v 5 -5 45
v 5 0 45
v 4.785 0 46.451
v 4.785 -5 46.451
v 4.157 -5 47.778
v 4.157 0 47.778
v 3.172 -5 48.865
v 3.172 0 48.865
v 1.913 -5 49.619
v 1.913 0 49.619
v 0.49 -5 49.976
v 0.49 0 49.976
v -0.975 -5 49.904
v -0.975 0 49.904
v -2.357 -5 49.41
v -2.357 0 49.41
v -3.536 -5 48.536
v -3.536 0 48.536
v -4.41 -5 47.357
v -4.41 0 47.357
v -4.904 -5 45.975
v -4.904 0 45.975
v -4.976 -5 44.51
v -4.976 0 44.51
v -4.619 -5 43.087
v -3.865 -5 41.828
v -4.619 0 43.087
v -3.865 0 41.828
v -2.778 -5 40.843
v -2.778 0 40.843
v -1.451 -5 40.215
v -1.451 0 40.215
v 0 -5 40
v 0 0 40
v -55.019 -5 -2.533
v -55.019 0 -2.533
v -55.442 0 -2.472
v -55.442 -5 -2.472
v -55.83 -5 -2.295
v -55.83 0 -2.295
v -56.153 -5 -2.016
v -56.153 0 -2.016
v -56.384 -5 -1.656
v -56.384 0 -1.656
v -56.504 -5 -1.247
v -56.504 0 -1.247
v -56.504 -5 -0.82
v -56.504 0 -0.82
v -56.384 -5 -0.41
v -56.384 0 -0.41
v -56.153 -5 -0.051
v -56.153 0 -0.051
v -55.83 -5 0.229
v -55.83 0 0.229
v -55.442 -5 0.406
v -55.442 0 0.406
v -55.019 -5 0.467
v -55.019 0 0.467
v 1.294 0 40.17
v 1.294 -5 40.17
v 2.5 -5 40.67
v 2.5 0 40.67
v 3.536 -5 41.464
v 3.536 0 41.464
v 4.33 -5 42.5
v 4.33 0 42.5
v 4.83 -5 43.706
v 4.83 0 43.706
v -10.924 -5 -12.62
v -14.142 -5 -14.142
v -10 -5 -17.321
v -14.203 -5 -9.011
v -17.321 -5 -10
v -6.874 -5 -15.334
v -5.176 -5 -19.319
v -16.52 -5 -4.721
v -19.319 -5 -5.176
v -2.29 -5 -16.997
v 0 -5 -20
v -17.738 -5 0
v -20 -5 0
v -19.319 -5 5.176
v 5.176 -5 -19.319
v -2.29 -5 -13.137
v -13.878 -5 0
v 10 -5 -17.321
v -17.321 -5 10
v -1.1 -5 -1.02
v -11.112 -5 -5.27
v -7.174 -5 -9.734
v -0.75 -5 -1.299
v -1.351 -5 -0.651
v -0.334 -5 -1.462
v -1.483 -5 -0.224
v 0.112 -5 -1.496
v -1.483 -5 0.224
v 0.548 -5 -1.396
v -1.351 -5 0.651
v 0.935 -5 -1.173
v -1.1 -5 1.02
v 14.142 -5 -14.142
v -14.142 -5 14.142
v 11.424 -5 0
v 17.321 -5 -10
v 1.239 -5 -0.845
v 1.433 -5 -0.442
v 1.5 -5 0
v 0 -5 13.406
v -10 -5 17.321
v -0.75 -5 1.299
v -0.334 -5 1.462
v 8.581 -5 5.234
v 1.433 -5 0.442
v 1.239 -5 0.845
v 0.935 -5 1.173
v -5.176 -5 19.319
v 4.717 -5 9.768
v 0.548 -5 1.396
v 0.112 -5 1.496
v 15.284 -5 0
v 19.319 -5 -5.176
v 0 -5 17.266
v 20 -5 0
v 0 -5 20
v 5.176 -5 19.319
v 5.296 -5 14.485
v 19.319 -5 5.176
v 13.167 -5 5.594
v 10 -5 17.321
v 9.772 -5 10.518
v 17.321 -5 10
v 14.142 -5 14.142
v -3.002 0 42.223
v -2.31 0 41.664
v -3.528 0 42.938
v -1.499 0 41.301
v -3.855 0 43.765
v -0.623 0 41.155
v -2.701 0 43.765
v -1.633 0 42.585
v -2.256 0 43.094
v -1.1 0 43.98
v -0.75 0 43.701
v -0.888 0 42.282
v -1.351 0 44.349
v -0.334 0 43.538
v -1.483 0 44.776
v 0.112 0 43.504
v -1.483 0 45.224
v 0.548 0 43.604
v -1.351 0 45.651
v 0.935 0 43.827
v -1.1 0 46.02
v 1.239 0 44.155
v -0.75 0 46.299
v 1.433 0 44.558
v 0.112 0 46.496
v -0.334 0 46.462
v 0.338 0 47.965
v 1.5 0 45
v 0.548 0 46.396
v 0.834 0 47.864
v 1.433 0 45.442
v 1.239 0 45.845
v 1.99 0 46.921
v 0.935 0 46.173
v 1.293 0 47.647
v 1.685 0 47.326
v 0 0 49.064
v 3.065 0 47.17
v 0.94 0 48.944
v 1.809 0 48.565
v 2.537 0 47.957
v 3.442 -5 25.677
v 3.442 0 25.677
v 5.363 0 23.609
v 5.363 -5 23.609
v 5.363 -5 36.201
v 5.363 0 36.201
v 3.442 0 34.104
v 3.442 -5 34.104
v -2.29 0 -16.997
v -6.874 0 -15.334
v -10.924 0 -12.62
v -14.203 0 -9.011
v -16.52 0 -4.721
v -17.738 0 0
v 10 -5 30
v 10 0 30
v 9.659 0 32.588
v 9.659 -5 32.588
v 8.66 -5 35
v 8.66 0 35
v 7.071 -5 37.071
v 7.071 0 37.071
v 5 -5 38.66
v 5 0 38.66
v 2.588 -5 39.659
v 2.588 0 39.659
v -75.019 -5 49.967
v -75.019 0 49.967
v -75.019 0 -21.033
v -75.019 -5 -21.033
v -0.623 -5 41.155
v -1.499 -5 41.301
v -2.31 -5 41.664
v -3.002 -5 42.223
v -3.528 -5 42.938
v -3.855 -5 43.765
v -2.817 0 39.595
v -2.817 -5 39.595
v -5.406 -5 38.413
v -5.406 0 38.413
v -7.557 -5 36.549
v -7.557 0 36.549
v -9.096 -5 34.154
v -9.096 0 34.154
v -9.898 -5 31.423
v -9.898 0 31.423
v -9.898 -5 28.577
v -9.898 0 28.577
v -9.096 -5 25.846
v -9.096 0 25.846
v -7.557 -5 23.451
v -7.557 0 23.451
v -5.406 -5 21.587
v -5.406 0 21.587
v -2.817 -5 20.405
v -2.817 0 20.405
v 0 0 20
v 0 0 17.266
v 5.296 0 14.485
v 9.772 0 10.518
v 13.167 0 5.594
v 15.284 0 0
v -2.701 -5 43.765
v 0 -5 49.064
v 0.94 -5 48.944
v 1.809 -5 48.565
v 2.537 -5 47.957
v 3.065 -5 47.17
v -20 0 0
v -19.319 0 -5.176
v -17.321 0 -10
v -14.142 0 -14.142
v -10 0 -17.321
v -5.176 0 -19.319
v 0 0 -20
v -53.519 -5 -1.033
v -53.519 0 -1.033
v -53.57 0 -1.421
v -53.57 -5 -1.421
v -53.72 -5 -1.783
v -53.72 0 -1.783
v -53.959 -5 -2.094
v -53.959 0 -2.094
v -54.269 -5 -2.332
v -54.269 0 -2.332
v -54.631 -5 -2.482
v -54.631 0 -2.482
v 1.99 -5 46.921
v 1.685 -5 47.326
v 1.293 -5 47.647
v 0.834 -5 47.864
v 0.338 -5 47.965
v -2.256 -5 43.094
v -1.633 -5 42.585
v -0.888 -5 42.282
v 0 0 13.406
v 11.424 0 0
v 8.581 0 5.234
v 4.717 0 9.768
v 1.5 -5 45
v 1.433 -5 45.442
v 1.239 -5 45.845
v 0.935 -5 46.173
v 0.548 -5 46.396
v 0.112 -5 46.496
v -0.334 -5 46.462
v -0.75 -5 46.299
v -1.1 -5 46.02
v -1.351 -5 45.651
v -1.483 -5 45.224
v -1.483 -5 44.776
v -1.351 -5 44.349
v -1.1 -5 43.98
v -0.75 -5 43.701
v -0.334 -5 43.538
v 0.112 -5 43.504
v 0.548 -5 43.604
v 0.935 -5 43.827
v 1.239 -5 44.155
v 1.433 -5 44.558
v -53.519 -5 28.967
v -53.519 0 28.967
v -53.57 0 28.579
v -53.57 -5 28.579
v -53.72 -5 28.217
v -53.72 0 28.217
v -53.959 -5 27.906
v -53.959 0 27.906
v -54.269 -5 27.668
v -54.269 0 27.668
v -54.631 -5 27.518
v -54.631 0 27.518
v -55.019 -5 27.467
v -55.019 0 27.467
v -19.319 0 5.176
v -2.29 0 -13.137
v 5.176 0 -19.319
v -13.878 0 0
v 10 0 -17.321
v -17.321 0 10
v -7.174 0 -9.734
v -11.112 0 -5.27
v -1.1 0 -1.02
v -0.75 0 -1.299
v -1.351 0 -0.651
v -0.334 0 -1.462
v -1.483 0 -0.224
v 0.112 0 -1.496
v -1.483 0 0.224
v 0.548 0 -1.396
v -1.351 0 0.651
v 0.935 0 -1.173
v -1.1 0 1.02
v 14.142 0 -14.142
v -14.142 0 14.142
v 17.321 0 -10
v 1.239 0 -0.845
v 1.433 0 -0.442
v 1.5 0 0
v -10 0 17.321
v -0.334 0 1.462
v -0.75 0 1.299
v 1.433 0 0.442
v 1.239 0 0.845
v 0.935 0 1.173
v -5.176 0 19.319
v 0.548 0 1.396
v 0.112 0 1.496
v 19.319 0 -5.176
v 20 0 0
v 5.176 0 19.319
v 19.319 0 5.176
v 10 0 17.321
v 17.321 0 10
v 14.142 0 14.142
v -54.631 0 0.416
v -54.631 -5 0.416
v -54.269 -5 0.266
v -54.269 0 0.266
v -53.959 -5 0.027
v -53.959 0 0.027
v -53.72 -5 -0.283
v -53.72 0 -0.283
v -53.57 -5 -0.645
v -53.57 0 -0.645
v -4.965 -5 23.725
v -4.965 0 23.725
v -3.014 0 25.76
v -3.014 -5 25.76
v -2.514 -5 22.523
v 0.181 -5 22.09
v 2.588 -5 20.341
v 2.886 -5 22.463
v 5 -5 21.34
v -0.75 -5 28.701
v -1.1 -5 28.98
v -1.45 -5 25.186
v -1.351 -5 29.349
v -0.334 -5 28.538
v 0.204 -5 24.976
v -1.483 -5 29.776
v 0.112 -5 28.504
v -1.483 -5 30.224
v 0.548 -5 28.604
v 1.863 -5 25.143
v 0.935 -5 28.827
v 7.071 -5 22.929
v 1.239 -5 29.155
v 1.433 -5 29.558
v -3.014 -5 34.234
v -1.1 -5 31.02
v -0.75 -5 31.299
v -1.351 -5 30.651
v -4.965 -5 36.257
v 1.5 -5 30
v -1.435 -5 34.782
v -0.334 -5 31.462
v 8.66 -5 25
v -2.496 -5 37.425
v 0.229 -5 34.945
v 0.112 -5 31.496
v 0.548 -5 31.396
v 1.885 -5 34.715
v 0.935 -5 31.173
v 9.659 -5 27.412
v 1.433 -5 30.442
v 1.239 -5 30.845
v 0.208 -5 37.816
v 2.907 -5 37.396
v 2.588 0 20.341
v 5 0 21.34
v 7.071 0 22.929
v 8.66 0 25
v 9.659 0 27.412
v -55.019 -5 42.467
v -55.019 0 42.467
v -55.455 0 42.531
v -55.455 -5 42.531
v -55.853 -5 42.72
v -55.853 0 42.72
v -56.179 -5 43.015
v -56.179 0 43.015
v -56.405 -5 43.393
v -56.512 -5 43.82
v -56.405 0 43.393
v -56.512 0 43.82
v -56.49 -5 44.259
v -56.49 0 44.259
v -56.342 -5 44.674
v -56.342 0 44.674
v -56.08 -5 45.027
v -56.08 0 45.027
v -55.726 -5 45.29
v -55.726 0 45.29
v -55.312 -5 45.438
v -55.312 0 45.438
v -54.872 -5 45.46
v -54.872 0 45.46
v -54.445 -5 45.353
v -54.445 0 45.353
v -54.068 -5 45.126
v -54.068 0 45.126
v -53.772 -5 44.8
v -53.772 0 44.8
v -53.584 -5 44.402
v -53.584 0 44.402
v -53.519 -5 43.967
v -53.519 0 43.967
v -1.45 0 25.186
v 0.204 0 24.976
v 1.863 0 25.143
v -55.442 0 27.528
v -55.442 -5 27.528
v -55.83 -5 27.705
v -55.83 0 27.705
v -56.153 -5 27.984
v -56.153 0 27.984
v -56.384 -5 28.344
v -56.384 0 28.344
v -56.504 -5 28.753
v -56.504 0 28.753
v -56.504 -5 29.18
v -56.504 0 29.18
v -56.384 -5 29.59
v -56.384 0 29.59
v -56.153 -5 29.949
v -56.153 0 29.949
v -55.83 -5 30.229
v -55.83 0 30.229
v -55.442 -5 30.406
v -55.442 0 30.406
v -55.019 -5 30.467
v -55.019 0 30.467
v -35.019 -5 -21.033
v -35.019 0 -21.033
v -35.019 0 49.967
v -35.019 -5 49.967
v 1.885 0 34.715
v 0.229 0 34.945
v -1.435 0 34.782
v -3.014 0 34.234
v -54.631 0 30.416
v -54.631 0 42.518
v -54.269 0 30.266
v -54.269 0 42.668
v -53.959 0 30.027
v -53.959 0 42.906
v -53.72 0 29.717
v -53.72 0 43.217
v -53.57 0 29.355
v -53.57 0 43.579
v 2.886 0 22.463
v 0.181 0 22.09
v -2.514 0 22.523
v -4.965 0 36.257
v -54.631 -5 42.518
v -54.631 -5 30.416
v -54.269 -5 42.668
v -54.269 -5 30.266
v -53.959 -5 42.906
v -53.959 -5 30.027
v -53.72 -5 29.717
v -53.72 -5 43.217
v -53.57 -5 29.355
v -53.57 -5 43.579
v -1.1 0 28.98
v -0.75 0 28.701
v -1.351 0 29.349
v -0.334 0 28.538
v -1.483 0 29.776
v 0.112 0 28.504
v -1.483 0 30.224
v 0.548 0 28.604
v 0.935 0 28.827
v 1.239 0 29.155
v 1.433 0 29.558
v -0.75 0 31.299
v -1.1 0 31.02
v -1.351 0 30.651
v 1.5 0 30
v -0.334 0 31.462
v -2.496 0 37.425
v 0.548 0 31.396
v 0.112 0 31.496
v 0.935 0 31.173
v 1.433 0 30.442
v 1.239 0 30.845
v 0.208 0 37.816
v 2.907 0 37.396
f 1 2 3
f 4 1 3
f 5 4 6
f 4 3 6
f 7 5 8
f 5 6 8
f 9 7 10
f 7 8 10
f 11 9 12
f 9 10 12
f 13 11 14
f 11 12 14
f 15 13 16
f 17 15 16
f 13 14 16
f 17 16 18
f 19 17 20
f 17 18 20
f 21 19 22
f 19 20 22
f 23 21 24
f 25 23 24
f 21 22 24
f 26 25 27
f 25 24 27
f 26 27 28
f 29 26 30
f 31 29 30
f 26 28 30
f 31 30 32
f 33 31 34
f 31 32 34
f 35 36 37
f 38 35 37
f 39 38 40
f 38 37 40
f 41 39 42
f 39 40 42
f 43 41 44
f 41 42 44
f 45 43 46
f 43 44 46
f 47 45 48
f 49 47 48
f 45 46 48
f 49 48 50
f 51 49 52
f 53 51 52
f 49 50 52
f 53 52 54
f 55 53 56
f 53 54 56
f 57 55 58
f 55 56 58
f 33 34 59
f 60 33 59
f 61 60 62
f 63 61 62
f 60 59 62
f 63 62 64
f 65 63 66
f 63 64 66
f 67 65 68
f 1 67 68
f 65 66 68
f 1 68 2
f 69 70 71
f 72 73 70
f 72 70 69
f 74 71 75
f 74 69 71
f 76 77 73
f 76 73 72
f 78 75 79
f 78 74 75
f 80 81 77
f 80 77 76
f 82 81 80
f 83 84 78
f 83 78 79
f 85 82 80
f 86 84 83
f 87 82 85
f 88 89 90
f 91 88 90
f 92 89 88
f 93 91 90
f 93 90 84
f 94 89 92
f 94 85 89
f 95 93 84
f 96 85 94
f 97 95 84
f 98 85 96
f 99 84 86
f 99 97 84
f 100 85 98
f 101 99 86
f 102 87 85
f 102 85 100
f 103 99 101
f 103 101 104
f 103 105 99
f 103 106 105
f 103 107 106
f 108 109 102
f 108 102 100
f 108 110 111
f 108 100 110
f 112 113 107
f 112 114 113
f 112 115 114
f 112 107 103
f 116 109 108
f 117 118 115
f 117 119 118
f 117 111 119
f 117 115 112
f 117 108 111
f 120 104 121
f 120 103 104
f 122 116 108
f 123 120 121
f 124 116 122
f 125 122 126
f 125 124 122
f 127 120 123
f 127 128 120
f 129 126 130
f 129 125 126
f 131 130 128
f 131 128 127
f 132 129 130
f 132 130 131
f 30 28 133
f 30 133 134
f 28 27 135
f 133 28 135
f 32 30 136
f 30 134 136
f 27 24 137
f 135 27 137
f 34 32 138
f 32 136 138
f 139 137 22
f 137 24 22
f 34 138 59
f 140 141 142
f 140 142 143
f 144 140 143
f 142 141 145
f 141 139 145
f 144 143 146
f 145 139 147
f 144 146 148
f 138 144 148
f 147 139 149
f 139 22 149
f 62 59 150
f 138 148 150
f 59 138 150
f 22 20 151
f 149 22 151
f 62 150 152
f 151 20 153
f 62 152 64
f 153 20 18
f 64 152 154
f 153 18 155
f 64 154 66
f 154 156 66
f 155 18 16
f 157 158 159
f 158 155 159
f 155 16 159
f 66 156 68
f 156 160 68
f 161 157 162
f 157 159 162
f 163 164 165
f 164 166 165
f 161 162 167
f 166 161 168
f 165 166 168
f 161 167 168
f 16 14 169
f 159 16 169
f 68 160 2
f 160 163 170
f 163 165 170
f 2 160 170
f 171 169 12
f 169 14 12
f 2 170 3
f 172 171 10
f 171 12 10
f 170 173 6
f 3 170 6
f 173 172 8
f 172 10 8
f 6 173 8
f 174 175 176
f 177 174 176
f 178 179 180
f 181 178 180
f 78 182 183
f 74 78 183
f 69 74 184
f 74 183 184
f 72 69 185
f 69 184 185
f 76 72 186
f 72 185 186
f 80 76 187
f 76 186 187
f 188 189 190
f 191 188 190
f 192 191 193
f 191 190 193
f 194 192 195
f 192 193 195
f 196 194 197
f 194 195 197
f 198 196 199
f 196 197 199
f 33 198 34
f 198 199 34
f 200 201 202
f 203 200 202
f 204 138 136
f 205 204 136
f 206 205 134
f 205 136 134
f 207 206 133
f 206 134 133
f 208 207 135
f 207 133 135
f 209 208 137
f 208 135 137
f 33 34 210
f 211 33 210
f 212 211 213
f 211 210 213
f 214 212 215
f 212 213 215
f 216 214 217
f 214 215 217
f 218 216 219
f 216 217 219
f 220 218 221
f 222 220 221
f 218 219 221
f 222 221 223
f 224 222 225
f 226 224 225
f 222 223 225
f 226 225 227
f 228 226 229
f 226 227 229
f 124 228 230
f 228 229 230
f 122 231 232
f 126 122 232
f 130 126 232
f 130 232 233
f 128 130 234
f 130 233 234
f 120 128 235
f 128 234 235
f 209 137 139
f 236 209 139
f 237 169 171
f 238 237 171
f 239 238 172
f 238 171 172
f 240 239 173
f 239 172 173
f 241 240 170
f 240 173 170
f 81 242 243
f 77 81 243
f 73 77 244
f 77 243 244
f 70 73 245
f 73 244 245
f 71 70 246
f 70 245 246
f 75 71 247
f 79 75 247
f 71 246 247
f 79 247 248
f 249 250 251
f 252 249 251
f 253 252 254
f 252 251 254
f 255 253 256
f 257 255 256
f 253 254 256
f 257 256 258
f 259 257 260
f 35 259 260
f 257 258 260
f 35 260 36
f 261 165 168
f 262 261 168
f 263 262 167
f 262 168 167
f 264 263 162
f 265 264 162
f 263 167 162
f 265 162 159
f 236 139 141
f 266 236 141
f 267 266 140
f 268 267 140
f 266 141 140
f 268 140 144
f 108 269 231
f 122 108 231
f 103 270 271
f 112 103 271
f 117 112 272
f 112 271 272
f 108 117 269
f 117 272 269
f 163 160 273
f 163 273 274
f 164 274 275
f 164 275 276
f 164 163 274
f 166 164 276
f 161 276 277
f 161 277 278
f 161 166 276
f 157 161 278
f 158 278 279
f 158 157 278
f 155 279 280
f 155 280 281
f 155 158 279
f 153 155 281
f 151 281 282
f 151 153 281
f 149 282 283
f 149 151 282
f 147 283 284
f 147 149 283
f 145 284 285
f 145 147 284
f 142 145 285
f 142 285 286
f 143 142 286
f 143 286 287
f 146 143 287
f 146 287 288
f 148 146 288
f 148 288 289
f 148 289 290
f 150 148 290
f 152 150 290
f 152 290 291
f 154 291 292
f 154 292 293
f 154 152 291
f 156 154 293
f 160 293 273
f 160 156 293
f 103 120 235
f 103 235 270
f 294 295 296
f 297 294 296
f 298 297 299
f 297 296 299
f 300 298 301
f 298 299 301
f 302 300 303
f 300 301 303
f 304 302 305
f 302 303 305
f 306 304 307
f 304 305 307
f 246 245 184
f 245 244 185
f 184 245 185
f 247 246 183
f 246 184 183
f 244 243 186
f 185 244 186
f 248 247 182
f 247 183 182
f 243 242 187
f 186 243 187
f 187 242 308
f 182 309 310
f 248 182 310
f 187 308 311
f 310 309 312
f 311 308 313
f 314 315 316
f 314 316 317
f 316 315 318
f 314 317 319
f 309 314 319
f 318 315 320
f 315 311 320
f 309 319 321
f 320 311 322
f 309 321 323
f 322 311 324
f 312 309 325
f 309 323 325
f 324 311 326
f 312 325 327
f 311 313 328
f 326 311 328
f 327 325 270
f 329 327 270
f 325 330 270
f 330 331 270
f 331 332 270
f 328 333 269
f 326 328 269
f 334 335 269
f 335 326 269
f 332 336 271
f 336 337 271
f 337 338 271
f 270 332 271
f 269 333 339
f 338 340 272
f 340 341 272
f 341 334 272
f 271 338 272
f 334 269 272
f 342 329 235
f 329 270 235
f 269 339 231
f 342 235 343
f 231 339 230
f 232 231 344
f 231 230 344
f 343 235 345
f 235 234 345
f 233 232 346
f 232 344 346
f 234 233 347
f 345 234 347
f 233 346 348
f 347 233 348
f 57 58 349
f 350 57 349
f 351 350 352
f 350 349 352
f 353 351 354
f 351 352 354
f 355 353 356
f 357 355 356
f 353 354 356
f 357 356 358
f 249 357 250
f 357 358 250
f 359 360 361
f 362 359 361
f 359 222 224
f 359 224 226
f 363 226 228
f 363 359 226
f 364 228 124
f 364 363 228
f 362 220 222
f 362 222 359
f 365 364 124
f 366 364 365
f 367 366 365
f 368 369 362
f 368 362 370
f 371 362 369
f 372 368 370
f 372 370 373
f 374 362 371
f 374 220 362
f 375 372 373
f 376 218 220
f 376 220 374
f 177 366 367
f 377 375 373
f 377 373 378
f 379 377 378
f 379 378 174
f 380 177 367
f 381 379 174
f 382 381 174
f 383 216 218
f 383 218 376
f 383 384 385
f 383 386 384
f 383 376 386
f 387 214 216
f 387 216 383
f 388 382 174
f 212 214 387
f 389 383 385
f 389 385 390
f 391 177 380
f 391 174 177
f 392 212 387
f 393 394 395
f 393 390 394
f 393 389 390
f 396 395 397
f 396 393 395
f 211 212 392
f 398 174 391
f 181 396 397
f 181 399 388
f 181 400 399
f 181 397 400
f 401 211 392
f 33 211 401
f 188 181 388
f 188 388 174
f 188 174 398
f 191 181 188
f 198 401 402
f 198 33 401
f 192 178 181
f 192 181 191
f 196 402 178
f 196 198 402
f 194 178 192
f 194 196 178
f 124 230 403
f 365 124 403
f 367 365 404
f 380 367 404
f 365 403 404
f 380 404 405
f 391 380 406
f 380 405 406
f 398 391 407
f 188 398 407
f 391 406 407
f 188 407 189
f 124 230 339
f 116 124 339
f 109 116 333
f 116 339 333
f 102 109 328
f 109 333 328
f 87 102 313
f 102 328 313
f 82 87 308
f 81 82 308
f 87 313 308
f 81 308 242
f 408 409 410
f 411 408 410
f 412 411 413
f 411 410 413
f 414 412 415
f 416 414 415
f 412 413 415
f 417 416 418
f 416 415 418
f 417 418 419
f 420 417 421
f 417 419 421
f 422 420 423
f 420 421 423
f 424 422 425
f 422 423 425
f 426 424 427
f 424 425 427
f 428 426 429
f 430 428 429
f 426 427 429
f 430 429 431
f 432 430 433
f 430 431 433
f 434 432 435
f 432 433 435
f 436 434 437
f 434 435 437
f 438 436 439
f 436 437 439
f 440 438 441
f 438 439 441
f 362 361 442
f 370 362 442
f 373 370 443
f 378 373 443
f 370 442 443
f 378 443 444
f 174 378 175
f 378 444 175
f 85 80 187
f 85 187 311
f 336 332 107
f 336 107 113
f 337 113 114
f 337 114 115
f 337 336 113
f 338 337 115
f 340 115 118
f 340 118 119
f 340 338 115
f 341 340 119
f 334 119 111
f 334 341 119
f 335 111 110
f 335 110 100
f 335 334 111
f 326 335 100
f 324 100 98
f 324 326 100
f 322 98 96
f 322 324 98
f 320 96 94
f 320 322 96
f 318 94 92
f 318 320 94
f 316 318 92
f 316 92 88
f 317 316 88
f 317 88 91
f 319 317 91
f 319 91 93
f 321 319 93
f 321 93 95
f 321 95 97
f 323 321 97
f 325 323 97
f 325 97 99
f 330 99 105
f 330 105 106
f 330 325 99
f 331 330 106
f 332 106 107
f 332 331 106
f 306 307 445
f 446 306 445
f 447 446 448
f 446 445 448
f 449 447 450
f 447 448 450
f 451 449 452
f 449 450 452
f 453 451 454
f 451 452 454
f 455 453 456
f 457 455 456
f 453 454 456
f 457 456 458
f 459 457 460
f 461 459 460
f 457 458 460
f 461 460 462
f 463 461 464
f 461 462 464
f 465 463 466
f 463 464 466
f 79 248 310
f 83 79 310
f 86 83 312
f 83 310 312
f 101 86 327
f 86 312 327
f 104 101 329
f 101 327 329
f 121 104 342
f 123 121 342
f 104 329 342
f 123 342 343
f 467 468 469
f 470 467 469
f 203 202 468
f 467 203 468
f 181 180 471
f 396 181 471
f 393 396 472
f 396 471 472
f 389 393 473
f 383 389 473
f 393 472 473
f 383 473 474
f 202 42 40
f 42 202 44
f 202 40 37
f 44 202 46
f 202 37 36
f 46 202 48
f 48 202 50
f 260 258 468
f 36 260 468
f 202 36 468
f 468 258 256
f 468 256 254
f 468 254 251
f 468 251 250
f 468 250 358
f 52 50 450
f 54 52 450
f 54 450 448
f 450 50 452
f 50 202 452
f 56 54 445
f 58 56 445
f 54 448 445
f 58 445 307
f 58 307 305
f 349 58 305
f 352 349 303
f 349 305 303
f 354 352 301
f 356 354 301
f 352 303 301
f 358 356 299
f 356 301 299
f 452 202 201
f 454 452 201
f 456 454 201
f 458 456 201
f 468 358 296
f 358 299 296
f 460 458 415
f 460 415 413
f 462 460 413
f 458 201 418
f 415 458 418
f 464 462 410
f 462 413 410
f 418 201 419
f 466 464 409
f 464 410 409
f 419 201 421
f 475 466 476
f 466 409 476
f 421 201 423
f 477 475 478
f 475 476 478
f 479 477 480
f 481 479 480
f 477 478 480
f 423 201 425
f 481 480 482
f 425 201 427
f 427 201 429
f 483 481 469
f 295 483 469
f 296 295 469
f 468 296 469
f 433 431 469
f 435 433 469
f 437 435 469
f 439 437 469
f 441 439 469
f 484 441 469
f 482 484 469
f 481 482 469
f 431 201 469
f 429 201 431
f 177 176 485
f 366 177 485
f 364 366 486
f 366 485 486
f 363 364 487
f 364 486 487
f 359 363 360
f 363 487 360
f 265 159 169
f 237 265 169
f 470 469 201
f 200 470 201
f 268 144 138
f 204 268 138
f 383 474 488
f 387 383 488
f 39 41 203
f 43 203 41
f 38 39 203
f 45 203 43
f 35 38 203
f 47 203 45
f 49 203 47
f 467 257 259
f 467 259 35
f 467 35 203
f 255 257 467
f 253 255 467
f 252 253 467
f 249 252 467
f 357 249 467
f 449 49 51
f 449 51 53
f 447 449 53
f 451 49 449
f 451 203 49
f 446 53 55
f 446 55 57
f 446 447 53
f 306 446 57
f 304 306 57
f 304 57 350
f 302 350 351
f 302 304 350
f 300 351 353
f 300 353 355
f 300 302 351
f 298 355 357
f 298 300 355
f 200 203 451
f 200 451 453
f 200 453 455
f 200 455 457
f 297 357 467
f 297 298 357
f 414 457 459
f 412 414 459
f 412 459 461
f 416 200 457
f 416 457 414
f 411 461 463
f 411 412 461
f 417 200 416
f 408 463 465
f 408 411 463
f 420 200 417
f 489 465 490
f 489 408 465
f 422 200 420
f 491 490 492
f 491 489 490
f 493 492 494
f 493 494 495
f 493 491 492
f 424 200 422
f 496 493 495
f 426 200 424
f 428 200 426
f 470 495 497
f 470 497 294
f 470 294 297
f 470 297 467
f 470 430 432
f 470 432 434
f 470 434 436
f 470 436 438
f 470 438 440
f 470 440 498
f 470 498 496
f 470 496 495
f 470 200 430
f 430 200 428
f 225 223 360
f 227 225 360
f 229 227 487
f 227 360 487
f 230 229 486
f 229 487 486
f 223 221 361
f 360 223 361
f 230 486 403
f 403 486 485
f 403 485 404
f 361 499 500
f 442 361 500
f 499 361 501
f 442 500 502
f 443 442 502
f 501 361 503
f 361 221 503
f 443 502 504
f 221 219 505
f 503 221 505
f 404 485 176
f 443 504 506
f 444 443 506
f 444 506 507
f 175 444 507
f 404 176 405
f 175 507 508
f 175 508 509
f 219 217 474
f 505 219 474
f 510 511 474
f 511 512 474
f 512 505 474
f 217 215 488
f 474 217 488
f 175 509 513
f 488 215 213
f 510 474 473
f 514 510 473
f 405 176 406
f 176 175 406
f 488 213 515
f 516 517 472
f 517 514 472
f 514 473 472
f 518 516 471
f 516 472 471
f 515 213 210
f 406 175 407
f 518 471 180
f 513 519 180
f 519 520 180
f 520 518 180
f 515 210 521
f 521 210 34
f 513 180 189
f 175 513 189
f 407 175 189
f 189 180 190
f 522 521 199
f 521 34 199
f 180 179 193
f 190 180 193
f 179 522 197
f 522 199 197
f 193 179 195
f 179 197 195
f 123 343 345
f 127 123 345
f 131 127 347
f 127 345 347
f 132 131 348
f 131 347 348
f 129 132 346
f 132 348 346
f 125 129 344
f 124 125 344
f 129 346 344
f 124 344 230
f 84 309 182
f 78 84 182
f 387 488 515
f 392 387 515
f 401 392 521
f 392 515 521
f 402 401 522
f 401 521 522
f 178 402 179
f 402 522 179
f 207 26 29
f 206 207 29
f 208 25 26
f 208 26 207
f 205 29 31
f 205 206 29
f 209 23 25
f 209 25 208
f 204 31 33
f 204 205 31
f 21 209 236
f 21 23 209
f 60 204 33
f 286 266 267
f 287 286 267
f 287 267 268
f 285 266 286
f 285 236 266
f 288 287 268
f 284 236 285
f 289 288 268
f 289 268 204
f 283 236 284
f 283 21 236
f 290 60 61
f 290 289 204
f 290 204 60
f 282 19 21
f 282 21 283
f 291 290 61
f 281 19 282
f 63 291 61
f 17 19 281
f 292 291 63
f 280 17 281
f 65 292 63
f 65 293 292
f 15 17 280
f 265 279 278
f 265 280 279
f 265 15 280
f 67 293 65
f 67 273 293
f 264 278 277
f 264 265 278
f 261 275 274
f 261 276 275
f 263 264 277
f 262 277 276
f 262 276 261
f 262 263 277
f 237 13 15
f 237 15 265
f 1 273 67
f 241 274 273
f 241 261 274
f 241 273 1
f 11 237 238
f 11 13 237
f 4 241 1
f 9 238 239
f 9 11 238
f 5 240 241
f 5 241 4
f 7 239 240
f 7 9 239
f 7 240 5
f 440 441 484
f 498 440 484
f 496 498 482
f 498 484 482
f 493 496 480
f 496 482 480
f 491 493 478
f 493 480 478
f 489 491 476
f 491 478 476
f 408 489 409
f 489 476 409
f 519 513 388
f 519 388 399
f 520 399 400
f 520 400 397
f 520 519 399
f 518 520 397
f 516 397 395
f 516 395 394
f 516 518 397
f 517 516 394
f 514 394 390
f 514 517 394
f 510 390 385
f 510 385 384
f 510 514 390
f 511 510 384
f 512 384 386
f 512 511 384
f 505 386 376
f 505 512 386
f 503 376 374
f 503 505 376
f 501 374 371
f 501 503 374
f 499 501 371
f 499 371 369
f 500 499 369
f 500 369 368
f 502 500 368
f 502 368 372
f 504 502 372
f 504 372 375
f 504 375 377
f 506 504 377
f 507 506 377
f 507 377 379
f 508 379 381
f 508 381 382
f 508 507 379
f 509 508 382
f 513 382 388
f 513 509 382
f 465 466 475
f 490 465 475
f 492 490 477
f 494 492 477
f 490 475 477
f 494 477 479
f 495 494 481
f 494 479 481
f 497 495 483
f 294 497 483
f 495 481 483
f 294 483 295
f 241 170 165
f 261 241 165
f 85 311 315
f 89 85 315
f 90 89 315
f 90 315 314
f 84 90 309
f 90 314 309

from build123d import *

# Parameters (mm, degrees)
F0_R     = 1.5
F1_DEPTH = 5
F2_DEPTH = 5
F3_DEPTH = 5
F4_DEPTH = 5


with BuildPart() as f1:
    # F0 (on Front) → F1 (new body)
    with BuildSketch(Plane.XZ):
        with BuildLine():
            ThreePointArc((-20, 0), (-14.142136, -14.142136), (0, -20))
            ThreePointArc((0, -20), (14.142136, -14.142136), (20, 0))
            ThreePointArc((20, 0), (14.142136, 14.142136), (0, 20))
            ThreePointArc((0, 20), (-14.142136, 14.142136), (-20, 0))
        make_face()
        with BuildLine():
            ThreePointArc((-2.290069, -16.996988), (-12.67294, -10.914976), (-17.738327, 0))
            Line((-17.738327, 0), (-13.878327, 0))
            ThreePointArc((-13.878327, 0), (-9.276577, -7.620303), (-2.290069, -13.136988))
            Line((-2.290069, -13.136988), (-2.290069, -16.996988))
        make_face(mode=Mode.SUBTRACT)
        Circle(F0_R, mode=Mode.SUBTRACT)
        with BuildLine():
            ThreePointArc((0, 17.265607), (9.771505, 10.517805), (15.2843, 0))
            Line((15.2843, 0), (11.4243, 0))
            ThreePointArc((11.4243, 0), (6.766719, 7.601511), (0, 13.405607))
            Line((0, 13.405607), (0, 17.265607))
        make_face(mode=Mode.SUBTRACT)
    extrude(amount=F1_DEPTH)

    # F0 (on Front) → F2 (join)
    with BuildSketch(Plane.XZ):
        with BuildLine():
            ThreePointArc((0, 40), (-10, 30), (0, 20))
            ThreePointArc((0, 20), (7.071068, 22.928932), (10, 30))
            ThreePointArc((10, 30), (7.071068, 37.071068), (0, 40))
        make_face()
        with BuildLine():
            ThreePointArc((5.36284, 23.60926), (0.181253, 22.089711), (-4.964996, 23.724947))
            Line((-4.964996, 23.724947), (-3.014296, 25.760487))
            ThreePointArc((-3.014296, 25.760487), (0.20403, 24.976245), (3.44163, 25.676675))
            Line((3.44163, 25.676675), (5.36284, 23.60926))
        make_face(mode=Mode.SUBTRACT)
        with Locations((0, 30)):
            Circle(F0_R, mode=Mode.SUBTRACT)
        with BuildLine():
            ThreePointArc((-4.964996, 36.256988), (0.207504, 37.816446), (5.36284, 36.201149))
            Line((5.36284, 36.201149), (3.44163, 34.104005))
            ThreePointArc((3.44163, 34.104005), (0.229253, 34.945193), (-3.014296, 34.233601))
            Line((-3.014296, 34.233601), (-4.964996, 36.256988))
        make_face(mode=Mode.SUBTRACT)
    extrude(amount=F2_DEPTH)

    # F0 (on Front) → F3 (join)
    with BuildSketch(Plane.XZ):
        with BuildLine():
            ThreePointArc((5, 45), (-3.535534, 48.535534), (0, 40))
            ThreePointArc((0, 40), (3.535534, 41.464466), (5, 45))
        make_face()
        with BuildLine():
            ThreePointArc((-0.622532, 41.155434), (-2.67396, 41.921184), (-3.85548, 43.764751))
            Line((-3.85548, 43.764751), (-2.701186, 43.764751))
            ThreePointArc((-2.701186, 43.764751), (-1.963578, 42.816276), (-0.887504, 42.281731))
            Line((-0.887504, 42.281731), (-0.622532, 41.155434))
        make_face(mode=Mode.SUBTRACT)
        with Locations((0, 45)):
            Circle(F0_R, mode=Mode.SUBTRACT)
        with BuildLine():
            ThreePointArc((0, 49.0641), (1.808913, 48.564547), (3.064678, 47.169998))
            Line((3.064678, 47.169998), (1.989979, 46.921063))
            ThreePointArc((1.989979, 46.921063), (1.292659, 47.647084), (0.337574, 47.965165))
            Line((0.337574, 47.965165), (0, 49.0641))
        make_face(mode=Mode.SUBTRACT)
    extrude(amount=F3_DEPTH)


with BuildPart() as f4:
    # F0 (on Front) → F4 (new body)
    with BuildSketch(Plane.XZ):
        Polygon((-35.019196, 49.96676), (-75.019196, 49.96676), (-75.019196, -21.03324), (-55.019196, -21.03324), (-35.019196, -21.03324), align=None)
        with BuildLine():
            ThreePointArc((-53.519196, -1.03324), (-53.958536, -2.093901), (-55.019196, -2.53324))
            ThreePointArc((-55.019196, -2.53324), (-56.519196, -1.03324), (-55.019196, 0.46676))
            ThreePointArc((-55.019196, 0.46676), (-53.958536, 0.02742), (-53.519196, -1.03324))
        make_face(mode=Mode.SUBTRACT)
        with BuildLine():
            ThreePointArc((-53.519196, 28.96676), (-53.958536, 27.906099), (-55.019196, 27.46676))
            ThreePointArc((-55.019196, 27.46676), (-56.519196, 28.96676), (-55.019196, 30.46676))
            ThreePointArc((-55.019196, 30.46676), (-53.958536, 30.02742), (-53.519196, 28.96676))
        make_face(mode=Mode.SUBTRACT)
        with BuildLine():
            ThreePointArc((-53.519196, 43.96676), (-53.958536, 42.906099), (-55.019196, 42.46676))
            ThreePointArc((-55.019196, 42.46676), (-56.079856, 45.02742), (-53.519196, 43.96676))
        make_face(mode=Mode.SUBTRACT)
    extrude(amount=F4_DEPTH)


solid = Compound([f1.part, f4.part])
